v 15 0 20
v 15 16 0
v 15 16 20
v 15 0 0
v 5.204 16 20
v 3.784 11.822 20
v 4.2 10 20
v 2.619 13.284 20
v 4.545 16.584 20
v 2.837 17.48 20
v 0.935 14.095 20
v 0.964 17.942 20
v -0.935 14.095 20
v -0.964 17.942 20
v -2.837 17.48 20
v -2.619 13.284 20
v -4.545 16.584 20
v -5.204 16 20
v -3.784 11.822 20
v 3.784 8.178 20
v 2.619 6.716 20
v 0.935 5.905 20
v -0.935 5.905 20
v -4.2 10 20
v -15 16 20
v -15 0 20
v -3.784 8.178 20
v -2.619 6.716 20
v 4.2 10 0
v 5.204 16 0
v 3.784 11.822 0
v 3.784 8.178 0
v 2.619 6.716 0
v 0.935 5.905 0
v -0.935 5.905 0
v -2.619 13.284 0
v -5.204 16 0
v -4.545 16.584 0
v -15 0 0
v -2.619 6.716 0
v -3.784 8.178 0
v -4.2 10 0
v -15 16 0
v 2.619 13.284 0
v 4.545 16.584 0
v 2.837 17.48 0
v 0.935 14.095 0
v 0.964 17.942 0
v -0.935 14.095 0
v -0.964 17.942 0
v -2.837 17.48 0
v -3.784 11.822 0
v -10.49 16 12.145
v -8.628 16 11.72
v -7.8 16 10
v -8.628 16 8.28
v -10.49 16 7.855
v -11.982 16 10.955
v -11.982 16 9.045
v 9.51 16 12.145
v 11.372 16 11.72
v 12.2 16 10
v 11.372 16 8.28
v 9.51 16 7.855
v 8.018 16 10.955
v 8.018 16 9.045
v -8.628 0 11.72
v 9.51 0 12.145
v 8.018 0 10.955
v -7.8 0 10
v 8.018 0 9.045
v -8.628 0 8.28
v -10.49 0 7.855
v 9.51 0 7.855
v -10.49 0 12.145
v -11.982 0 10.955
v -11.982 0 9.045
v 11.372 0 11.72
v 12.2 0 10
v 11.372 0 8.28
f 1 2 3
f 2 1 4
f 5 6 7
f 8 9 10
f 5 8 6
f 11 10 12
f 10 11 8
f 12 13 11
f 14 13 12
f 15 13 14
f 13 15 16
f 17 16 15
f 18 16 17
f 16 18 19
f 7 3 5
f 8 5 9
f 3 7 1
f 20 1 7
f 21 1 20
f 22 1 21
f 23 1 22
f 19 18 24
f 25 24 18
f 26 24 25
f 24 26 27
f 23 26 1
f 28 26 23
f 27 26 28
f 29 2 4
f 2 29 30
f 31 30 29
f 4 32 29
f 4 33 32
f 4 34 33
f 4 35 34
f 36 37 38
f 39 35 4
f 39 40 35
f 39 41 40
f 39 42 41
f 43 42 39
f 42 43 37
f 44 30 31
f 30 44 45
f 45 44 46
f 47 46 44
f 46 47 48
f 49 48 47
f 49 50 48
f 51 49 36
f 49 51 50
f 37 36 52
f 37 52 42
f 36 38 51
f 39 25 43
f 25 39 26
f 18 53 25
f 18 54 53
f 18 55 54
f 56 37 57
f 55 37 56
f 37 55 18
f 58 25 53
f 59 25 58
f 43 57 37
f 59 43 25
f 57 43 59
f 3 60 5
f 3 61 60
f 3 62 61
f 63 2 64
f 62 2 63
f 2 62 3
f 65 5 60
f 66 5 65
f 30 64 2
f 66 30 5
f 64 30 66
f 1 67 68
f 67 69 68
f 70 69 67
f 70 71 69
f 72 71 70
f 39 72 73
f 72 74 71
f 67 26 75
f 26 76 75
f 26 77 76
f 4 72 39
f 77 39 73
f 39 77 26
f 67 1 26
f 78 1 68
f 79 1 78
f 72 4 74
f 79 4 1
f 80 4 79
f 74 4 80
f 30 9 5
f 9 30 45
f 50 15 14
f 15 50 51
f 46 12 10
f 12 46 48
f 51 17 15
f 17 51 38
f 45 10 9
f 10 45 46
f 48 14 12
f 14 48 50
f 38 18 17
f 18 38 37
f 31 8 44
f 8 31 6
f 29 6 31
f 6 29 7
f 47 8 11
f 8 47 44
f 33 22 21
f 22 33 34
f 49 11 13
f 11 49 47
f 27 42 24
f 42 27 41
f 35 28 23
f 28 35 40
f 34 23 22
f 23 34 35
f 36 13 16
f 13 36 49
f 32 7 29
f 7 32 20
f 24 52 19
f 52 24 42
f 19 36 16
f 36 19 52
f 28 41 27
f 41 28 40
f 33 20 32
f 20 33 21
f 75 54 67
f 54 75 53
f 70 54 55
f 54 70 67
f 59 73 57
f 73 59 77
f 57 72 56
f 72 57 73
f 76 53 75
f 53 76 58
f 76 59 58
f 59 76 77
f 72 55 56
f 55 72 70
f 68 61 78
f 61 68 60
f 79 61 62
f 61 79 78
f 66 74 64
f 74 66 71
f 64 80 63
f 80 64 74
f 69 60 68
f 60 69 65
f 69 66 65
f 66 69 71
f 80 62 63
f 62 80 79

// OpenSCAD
module toto(){
    h = 20;
    difference(){
        union(){
            translate([-15, 0, 0]) cube([30, 16, h]);
            hull(){
                translate([-8, 0, 0]) cube([16, 3, h]);
                translate([0, 10, 0]) cylinder(r= 8, h);
            }
        }
        translate([0, 10, -1]) cylinder(r= 4.2, h+2);
        translate([-10, 10, h/2]) rotate([90,0,0]) cylinder(r= 2.2, 100, center = true);
        translate([ 10, 10, h/2]) rotate([90,0,0]) cylinder(r= 2.2, 100, center = true);
    }
    
}

toto();
